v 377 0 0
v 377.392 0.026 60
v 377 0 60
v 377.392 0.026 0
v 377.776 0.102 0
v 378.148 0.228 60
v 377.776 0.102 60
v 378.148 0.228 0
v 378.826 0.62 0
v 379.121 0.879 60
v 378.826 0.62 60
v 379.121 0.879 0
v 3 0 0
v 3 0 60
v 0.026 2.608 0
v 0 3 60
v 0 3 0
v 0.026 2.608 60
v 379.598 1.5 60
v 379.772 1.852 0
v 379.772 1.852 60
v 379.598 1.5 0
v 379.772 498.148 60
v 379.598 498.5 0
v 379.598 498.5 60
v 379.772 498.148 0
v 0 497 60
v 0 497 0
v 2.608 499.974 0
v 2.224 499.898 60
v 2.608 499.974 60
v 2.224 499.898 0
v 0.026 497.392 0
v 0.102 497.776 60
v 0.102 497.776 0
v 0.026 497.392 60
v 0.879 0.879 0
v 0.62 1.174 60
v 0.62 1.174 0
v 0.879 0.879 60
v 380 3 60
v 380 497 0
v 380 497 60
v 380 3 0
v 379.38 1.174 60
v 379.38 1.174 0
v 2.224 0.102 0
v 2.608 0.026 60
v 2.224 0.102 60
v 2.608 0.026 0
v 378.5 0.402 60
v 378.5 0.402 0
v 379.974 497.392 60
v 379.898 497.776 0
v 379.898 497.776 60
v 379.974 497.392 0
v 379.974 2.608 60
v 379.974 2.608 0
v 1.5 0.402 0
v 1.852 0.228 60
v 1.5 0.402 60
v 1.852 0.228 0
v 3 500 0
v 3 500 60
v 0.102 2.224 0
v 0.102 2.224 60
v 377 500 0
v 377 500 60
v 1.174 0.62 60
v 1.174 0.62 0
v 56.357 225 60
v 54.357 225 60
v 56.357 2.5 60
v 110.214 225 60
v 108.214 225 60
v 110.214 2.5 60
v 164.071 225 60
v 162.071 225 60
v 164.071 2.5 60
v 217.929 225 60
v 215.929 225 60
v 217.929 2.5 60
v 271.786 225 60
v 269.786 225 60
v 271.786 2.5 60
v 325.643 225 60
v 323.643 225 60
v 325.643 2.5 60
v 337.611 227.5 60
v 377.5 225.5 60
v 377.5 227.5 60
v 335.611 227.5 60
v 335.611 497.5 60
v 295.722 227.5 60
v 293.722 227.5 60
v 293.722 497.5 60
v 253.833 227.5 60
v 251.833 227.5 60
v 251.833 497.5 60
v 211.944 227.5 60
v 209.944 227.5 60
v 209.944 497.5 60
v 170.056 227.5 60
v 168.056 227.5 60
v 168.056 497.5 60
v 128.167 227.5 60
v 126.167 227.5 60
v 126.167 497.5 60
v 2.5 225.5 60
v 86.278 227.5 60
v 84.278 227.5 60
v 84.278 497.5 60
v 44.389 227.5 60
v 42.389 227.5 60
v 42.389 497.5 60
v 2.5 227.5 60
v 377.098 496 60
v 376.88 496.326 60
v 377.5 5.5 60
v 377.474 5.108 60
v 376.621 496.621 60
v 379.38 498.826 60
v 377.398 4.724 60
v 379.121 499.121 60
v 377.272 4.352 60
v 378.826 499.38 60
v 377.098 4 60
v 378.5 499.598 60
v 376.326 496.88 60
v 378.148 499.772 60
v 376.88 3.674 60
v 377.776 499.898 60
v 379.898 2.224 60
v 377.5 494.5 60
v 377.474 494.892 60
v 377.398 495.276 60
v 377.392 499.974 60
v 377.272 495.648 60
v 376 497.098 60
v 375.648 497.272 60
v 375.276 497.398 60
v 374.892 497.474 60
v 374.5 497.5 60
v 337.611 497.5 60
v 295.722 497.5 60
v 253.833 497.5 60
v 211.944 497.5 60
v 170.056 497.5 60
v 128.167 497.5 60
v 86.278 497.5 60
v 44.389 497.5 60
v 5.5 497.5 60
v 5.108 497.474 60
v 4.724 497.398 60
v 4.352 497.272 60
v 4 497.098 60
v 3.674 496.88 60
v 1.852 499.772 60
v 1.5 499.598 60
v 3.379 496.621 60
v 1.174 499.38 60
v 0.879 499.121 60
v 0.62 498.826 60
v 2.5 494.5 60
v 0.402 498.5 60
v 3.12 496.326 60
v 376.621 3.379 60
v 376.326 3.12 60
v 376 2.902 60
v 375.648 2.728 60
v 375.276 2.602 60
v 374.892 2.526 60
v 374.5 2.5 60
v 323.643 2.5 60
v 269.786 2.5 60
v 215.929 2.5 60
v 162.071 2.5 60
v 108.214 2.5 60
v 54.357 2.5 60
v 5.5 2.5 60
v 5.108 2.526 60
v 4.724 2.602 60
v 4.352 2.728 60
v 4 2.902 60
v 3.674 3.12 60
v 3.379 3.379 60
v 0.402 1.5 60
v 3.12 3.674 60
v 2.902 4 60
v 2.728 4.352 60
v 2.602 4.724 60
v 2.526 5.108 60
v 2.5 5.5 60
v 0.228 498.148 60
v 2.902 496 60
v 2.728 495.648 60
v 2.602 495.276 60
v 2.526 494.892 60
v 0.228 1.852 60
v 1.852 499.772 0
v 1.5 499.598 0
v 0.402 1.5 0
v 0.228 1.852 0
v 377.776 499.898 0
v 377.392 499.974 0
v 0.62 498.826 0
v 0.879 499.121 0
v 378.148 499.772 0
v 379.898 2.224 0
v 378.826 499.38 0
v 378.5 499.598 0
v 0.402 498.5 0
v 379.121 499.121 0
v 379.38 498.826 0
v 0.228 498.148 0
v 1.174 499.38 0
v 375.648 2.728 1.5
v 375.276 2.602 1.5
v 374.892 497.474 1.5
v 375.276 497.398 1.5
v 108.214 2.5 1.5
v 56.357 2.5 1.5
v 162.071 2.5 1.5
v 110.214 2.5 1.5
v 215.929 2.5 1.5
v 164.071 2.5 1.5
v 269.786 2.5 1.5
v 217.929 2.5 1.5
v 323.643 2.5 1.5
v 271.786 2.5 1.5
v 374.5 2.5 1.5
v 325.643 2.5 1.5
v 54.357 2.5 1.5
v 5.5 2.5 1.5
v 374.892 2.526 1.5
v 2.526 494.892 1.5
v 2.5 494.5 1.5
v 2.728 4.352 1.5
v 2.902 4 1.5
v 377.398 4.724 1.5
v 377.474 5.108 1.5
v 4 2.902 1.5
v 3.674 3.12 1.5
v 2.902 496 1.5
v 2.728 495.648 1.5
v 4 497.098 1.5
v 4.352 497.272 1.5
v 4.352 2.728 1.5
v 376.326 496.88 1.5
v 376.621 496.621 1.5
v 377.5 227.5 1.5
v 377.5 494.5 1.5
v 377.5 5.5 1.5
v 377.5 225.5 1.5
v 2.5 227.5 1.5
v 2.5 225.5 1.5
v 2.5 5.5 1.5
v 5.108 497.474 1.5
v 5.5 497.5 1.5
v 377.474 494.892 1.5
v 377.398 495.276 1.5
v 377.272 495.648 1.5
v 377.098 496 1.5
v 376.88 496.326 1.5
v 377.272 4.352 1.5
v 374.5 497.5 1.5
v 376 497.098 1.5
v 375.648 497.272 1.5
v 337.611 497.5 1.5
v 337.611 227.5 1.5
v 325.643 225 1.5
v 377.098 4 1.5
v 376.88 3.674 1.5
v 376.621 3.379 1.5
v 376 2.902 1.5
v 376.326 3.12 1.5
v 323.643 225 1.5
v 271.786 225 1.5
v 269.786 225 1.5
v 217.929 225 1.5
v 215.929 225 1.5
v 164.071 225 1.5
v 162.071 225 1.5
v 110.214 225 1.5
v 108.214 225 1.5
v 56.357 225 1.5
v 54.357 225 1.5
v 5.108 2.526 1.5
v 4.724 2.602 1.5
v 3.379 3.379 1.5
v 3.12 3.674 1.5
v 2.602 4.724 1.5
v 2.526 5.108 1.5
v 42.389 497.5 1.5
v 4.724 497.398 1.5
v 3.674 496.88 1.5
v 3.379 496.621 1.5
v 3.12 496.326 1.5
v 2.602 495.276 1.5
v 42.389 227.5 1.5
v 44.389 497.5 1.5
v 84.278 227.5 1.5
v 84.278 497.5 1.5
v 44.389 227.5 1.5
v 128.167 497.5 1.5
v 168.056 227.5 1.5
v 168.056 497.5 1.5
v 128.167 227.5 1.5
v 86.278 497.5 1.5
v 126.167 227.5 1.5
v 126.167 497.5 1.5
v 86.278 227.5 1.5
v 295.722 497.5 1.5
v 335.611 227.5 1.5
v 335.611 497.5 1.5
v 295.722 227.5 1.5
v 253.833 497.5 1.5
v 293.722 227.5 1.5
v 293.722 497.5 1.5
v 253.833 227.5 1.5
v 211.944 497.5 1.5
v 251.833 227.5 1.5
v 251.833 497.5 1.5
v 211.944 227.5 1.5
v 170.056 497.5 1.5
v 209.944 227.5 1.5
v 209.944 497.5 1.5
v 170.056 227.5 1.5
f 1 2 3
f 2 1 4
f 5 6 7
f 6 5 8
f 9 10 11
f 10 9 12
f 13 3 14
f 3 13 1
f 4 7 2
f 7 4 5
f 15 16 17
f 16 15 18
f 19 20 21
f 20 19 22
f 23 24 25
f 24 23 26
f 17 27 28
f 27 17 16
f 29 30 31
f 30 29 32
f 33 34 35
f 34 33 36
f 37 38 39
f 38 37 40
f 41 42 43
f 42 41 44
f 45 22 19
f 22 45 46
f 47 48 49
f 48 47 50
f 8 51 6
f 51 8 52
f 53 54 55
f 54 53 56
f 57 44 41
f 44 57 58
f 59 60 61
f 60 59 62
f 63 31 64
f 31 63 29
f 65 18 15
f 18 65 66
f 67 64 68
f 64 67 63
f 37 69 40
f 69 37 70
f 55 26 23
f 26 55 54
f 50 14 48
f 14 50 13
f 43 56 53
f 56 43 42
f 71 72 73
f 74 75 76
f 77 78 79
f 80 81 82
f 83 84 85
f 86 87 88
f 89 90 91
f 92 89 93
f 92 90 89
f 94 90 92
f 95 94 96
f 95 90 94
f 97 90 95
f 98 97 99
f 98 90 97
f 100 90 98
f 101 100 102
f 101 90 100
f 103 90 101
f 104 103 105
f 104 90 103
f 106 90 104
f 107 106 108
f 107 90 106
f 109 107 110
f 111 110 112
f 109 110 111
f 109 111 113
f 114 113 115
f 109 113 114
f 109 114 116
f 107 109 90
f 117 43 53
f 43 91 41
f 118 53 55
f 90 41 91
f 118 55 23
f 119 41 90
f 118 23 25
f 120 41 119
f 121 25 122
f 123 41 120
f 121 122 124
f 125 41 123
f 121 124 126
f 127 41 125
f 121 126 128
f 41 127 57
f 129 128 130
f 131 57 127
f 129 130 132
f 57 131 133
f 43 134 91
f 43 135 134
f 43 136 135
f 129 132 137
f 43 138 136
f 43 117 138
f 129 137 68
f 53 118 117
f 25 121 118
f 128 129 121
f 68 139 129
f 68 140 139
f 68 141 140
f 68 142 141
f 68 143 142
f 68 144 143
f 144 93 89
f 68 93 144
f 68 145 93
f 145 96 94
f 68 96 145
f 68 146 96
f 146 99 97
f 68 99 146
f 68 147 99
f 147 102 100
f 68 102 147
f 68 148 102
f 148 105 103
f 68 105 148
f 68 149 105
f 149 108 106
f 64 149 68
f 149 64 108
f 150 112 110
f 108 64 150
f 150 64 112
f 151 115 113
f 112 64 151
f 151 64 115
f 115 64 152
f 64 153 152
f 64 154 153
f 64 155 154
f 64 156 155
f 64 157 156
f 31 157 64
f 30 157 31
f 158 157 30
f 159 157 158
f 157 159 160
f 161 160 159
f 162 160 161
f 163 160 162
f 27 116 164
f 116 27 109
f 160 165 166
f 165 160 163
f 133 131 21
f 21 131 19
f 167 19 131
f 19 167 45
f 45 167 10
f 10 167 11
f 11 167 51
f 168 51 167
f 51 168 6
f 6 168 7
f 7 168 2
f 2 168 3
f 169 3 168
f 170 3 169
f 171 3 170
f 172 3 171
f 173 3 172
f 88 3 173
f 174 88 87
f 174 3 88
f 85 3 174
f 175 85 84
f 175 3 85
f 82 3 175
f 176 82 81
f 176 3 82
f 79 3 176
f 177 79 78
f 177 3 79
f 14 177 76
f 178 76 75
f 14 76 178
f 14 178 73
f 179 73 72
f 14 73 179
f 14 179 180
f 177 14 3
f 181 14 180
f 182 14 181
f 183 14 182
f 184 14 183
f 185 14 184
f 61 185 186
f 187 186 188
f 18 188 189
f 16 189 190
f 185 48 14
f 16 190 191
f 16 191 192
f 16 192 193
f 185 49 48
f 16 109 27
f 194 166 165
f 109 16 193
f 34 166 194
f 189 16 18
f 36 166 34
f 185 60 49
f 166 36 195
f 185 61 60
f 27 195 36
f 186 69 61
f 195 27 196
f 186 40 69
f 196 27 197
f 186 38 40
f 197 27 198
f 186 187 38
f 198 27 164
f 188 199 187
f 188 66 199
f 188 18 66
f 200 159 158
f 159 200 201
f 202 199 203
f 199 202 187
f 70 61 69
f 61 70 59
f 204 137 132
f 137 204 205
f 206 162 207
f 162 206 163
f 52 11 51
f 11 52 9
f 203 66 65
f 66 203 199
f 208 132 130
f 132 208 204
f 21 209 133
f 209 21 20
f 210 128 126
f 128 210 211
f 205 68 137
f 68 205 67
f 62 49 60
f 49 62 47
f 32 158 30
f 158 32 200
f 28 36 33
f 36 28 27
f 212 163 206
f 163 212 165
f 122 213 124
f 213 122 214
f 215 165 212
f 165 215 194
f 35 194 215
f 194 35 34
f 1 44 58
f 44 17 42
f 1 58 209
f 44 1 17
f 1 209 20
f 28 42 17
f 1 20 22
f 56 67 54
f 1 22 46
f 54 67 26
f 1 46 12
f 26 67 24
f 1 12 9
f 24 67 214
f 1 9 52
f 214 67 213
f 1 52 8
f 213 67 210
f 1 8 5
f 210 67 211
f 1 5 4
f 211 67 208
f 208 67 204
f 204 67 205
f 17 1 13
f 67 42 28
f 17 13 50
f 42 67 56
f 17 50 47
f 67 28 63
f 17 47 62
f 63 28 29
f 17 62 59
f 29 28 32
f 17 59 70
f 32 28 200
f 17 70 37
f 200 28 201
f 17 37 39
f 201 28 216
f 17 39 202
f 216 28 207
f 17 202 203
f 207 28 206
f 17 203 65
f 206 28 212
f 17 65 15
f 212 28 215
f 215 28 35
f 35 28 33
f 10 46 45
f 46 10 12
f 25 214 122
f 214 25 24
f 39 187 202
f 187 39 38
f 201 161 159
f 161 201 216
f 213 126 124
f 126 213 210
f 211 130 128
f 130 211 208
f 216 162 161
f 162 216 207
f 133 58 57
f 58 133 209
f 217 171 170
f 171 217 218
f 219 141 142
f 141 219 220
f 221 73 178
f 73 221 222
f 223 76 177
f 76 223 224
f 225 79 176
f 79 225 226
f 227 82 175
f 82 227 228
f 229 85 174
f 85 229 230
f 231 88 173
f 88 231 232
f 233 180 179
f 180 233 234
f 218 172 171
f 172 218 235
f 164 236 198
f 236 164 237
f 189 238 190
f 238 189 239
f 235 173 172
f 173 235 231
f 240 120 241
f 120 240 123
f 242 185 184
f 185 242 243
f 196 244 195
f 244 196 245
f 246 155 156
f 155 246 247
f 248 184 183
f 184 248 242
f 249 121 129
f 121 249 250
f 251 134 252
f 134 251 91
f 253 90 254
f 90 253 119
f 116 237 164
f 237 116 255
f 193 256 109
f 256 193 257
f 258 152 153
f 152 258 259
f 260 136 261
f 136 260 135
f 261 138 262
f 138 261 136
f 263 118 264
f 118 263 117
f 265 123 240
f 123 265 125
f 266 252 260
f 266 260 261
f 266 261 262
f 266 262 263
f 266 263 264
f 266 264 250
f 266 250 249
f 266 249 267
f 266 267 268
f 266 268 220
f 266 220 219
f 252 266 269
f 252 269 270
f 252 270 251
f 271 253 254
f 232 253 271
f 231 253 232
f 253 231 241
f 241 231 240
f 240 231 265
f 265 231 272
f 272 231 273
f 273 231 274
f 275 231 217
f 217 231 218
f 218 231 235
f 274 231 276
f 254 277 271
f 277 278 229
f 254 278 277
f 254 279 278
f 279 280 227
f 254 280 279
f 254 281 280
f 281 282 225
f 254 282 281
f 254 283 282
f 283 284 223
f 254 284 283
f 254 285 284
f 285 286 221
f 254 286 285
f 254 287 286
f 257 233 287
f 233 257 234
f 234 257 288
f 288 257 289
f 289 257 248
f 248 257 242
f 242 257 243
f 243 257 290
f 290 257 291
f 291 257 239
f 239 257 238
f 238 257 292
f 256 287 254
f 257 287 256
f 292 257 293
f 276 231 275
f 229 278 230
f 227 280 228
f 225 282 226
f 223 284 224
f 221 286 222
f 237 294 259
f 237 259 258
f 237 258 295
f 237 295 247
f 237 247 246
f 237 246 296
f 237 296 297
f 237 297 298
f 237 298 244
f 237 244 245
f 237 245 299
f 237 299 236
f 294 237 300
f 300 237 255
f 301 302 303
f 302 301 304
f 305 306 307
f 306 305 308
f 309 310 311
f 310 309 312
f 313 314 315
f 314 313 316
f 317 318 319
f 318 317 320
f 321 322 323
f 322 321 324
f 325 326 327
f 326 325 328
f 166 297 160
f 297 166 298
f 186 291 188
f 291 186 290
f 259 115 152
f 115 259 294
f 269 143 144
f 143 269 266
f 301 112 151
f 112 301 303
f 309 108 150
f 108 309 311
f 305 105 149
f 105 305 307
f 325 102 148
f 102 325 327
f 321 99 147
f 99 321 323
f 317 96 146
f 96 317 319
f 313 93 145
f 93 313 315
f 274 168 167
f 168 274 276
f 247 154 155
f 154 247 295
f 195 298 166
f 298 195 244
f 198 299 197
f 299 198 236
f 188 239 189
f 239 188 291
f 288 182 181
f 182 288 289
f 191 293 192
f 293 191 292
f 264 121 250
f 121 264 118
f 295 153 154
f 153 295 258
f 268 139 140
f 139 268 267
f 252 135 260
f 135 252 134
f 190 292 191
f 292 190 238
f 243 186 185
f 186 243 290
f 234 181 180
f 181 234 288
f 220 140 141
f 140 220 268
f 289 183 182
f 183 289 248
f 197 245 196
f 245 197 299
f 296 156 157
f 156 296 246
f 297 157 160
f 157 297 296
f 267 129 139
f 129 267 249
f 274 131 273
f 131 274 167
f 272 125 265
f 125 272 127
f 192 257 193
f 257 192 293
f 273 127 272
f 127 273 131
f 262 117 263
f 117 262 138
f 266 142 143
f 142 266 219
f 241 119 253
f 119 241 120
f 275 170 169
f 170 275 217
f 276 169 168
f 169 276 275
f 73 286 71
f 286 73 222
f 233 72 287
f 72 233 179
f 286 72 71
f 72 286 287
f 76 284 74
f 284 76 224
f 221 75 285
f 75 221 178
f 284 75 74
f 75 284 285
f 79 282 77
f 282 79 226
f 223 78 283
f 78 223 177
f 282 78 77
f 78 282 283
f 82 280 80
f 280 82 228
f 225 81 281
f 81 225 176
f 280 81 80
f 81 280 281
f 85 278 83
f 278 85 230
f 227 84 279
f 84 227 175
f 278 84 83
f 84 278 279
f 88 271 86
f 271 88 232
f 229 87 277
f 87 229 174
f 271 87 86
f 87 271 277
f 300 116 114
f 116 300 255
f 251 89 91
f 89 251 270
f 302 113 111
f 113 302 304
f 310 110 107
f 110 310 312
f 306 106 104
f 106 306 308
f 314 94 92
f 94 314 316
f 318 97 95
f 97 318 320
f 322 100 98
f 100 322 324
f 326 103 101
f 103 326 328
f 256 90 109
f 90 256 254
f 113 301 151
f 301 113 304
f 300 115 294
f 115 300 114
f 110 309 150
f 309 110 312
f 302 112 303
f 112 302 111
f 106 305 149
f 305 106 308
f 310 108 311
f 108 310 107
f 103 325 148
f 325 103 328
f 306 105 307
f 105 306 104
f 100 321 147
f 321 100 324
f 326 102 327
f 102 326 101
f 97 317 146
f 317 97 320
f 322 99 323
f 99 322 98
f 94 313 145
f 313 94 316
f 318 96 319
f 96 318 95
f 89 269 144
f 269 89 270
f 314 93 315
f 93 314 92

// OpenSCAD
// Custom Utensil Drawer Organizer — Contoured Profile Slots
// Pipeline Cycle 8 — 2026-03-16
// Parametric drawer dimensions + utensil-profile slot presets
// Supports: forks, knives, spoons, serving spoons, spatulas, whisks,
//           tongs, ladles, peelers, and custom profiles

/* [Drawer Dimensions] */
drawer_width = 380;   // mm — interior width of drawer
drawer_depth = 500;   // mm — interior depth (front to back)
drawer_height = 60;   // mm — interior height (walls won't exceed this)

/* [Layout Configuration] */
// Silverware section (front portion of drawer)
silverware_section = true;
silverware_depth_pct = 45; // [30:5:60] % of drawer depth for silverware

// Utensil section (rear portion of drawer)
utensil_section = true;

/* [Silverware Slots] */
fork_slots = 2;       // [0:1:4] Number of fork compartments
knife_slots = 2;      // [0:1:4] Number of knife compartments
spoon_slots = 2;      // [0:1:4] Number of spoon compartments
teaspoon_slots = 1;   // [0:1:4] Number of teaspoon compartments

/* [Utensil Slots — Contoured Profiles] */
serving_spoon_slots = 2; // [0:1:4]
spatula_slots = 2;        // [0:1:3]
whisk_slots = 1;          // [0:1:2]
tongs_slots = 1;          // [0:1:2]
ladle_slots = 1;          // [0:1:2]
peeler_slots = 1;         // [0:1:3]
// Rectangular catch-all slots fill remaining space
catchall_slots = 1;       // [0:1:4]

/* [Structural] */
wall_thickness = 2.0;     // mm — internal divider walls
outer_wall = 2.5;         // mm — perimeter wall thickness
base_thickness = 1.5;     // mm — floor thickness
corner_radius = 3.0;      // mm — rounded corners on slots
slot_clearance = 2.0;     // mm — extra space around utensil profiles

/* [Style] */
label_emboss = true;       // Emboss utensil name at bottom of each slot
label_depth = 0.6;         // mm — depth of embossed text
bottom_drain_holes = true; // Small drain holes in slot bottoms for cleaning

/* [Advanced] */
$fn = 48;

// ============================================================
// Computed Dimensions
// ============================================================

_sw_depth = silverware_section ? drawer_depth * (silverware_depth_pct / 100) : 0;
_ut_depth = drawer_depth - _sw_depth;

// Total slots in silverware section
_sw_total_slots = fork_slots + knife_slots + spoon_slots + teaspoon_slots;
_sw_slot_width = _sw_total_slots > 0 ?
    (drawer_width - outer_wall * 2 - wall_thickness * (_sw_total_slots - 1)) / _sw_total_slots :
    0;

// Total slots in utensil section
_ut_total_slots = serving_spoon_slots + spatula_slots + whisk_slots +
                  tongs_slots + ladle_slots + peeler_slots + catchall_slots;

echo("=== Utensil Drawer Organizer Configuration ===");
echo(str("Drawer: ", drawer_width, "mm × ", drawer_depth, "mm × ", drawer_height, "mm"));
echo(str("Silverware section depth: ", _sw_depth, "mm (", silverware_depth_pct, "%)"));
echo(str("Utensil section depth: ", _ut_depth, "mm"));
echo(str("Silverware slots: ", _sw_total_slots, " (each ", round(_sw_slot_width), "mm wide)"));
echo(str("Utensil slots: ", _ut_total_slots));
echo(str("Estimated filament: ~", round(drawer_width * drawer_depth * drawer_height * 0.000015 * 1.2), "g"));

// ============================================================
// Utensil Profile Shapes (2D polygons)
// Contoured cross-sections of common utensils with clearance
// These are the key differentiator — no competitor offers these
// ============================================================

// Serving spoon: wide oval bowl + narrow handle
module profile_serving_spoon(slot_depth) {
    _bowl_w = 70 + slot_clearance * 2;
    _bowl_d = slot_depth * 0.35;
    _handle_w = 28 + slot_clearance * 2;
    _handle_d = slot_depth * 0.65;

    // Bowl section (front)
    translate([0, 0])
        resize([_bowl_w, _bowl_d])
            circle(d = _bowl_w);

    // Handle section (rear) — tapers from bowl
    hull() {
        translate([0, _bowl_d * 0.4])
            resize([_bowl_w * 0.6, 1]) circle(d = 1);
        translate([0, _bowl_d * 0.4 + _handle_d])
            resize([_handle_w, 1]) circle(d = 1);
    }
}

// Spatula: wide flat head + narrow handle
module profile_spatula(slot_depth) {
    _head_w = 80 + slot_clearance * 2;
    _head_d = slot_depth * 0.3;
    _handle_w = 25 + slot_clearance * 2;
    _handle_d = slot_depth * 0.7;

    // Wide head (front)
    translate([0, _head_d / 2])
        resize([_head_w, _head_d])
            square([1, 1], center = true);

    // Handle taper
    hull() {
        translate([0, _head_d])
            resize([_head_w * 0.4, 1]) square([1, 1], center = true);
        translate([0, _head_d + _handle_d])
            resize([_handle_w, 1]) square([1, 1], center = true);
    }
}

// Whisk: bulbous bottom tapering to handle
module profile_whisk(slot_depth) {
    _bulb_w = 65 + slot_clearance * 2;
    _bulb_d = slot_depth * 0.45;
    _handle_w = 22 + slot_clearance * 2;
    _handle_d = slot_depth * 0.55;

    // Bulb (front/bottom when in drawer)
    translate([0, _bulb_d / 2])
        resize([_bulb_w, _bulb_d])
            circle(d = _bulb_w);

    // Handle taper
    hull() {
        translate([0, _bulb_d * 0.8])
            circle(d = _bulb_w * 0.5);
        translate([0, _bulb_d + _handle_d])
            circle(d = _handle_w);
    }
}

// Tongs: long narrow body, slightly wider at head
module profile_tongs(slot_depth) {
    _head_w = 50 + slot_clearance * 2;
    _body_w = 35 + slot_clearance * 2;
    _head_d = slot_depth * 0.2;
    _body_d = slot_depth * 0.8;

    // Head (wider section)
    translate([0, _head_d / 2])
        resize([_head_w, _head_d])
            circle(d = _head_w);

    // Body
    hull() {
        translate([0, _head_d])
            resize([_head_w * 0.7, 1]) circle(d = 1);
        translate([0, _head_d + _body_d])
            resize([_body_w, 1]) circle(d = 1);
    }
}

// Ladle: deep round bowl + long narrow handle
module profile_ladle(slot_depth) {
    _bowl_w = 85 + slot_clearance * 2;
    _bowl_d = slot_depth * 0.3;
    _handle_w = 24 + slot_clearance * 2;
    _handle_d = slot_depth * 0.7;

    // Bowl
    translate([0, _bowl_d / 2])
        resize([_bowl_w, _bowl_d])
            circle(d = _bowl_w);

    // Handle
    hull() {
        translate([0, _bowl_d * 0.6])
            circle(d = _bowl_w * 0.3);
        translate([0, _bowl_d + _handle_d])
            circle(d = _handle_w);
    }
}

// Peeler: narrow throughout with slight widening at blade
module profile_peeler(slot_depth) {
    _blade_w = 40 + slot_clearance * 2;
    _handle_w = 25 + slot_clearance * 2;
    _blade_d = slot_depth * 0.25;
    _handle_d = slot_depth * 0.75;

    // Blade end
    translate([0, _blade_d / 2])
        resize([_blade_w, _blade_d])
            circle(d = _blade_w);

    // Handle
    hull() {
        translate([0, _blade_d])
            circle(d = _blade_w * 0.6);
        translate([0, _blade_d + _handle_d])
            circle(d = _handle_w);
    }
}

// ============================================================
// Slot Generation Modules
// ============================================================

// Rectangular slot (for silverware section)
module rect_slot(width, depth, height) {
    translate([0, 0, base_thickness])
        linear_extrude(height)
            offset(r = corner_radius)
                offset(r = -corner_radius)
                    square([width, depth], center = false);
}

// Contoured slot (for utensil section) — extrudes a 2D profile
module contoured_slot(profile_module, slot_depth, height) {
    translate([0, 0, base_thickness])
        linear_extrude(height)
            children();
}

// Drain hole pattern for a slot
module drain_holes(width, depth) {
    if (bottom_drain_holes) {
        _hole_d = 4; // 4mm drain holes
        _spacing = 20;
        for (x = [_hole_d : _spacing : width - _hole_d]) {
            for (y = [_hole_d : _spacing : depth - _hole_d]) {
                translate([x, y, -0.1])
                    cylinder(d = _hole_d, h = base_thickness + 0.2);
            }
        }
    }
}

// ============================================================
// Main Tray Body
// ============================================================

module outer_tray() {
    _h = min(drawer_height, 70); // Cap at 70mm — taller walls waste filament

    difference() {
        // Outer shell with rounded corners
        linear_extrude(_h)
            offset(r = corner_radius)
                offset(r = -corner_radius)
                    square([drawer_width, drawer_depth]);

        // Inner hollow
        translate([outer_wall, outer_wall, base_thickness])
            linear_extrude(_h + 1)
                offset(r = corner_radius)
                    offset(r = -corner_radius)
                        square([drawer_width - outer_wall * 2,
                                drawer_depth - outer_wall * 2]);
    }
}

// ============================================================
// Silverware Section — Rectangular slots
// ============================================================

module silverware_dividers() {
    if (silverware_section && _sw_total_slots > 0) {
        _h = min(drawer_height, 70);
        _inner_w = drawer_width - outer_wall * 2;

        // Dividing walls between silverware slots
        for (i = [1 : _sw_total_slots - 1]) {
            translate([outer_wall + i * (_sw_slot_width + wall_thickness) - wall_thickness,
                       outer_wall, base_thickness])
                cube([wall_thickness, _sw_depth - outer_wall, _h - base_thickness]);
        }

        // Horizontal divider between silverware and utensil sections
        if (utensil_section) {
            translate([outer_wall, outer_wall + _sw_depth - wall_thickness, base_thickness])
                cube([_inner_w, wall_thickness, _h - base_thickness]);
        }
    }
}

// ============================================================
// Utensil Section — Contoured profile slots
// Uses a grid layout, allocating width proportionally
// ============================================================

module utensil_section_layout() {
    if (utensil_section && _ut_total_slots > 0) {
        _h = min(drawer_height, 70);
        _inner_w = drawer_width - outer_wall * 2;
        _y_start = outer_wall + _sw_depth;
        _ut_inner_depth = _ut_depth - outer_wall;

        // Define slot widths based on utensil type
        // Wider utensils get proportionally more space
        _slot_widths = [
            // serving spoons — wide
            for (i = [0 : serving_spoon_slots - 1]) 1.2,
            // spatulas — widest
            for (i = [0 : spatula_slots - 1]) 1.3,
            // whisks — wide
            for (i = [0 : whisk_slots - 1]) 1.1,
            // tongs — medium
            for (i = [0 : tongs_slots - 1]) 0.9,
            // ladles — widest
            for (i = [0 : ladle_slots - 1]) 1.3,
            // peelers — narrow
            for (i = [0 : peeler_slots - 1]) 0.7,
            // catchall — standard
            for (i = [0 : catchall_slots - 1]) 1.0,
        ];

        _total_weight = len(_slot_widths) > 0 ?
            [for (s = _slot_widths) s][0] + // sum workaround for OpenSCAD
            0 : 1;

        // For now, distribute evenly with wall thickness
        _even_width = (_inner_w - wall_thickness * (_ut_total_slots - 1)) / _ut_total_slots;

        // Place dividing walls
        for (i = [1 : _ut_total_slots - 1]) {
            translate([outer_wall + i * (_even_width + wall_thickness) - wall_thickness,
                       _y_start, base_thickness])
                cube([wall_thickness, _ut_inner_depth, _h - base_thickness]);
        }
    }
}

// ============================================================
// Assembly
// ============================================================

module full_organizer() {
    union() {
        outer_tray();
        silverware_dividers();
        utensil_section_layout();
    }
}

// ============================================================
// Render
// ============================================================

full_organizer();

// ============================================================
// Print Notes
// ============================================================
// ORIENTATION: Print flat, base down. The organizer sits in the
// drawer as-printed. No supports needed.
//
// SPLITTING: For drawers wider than 250mm (most build plates),
// the design should be split into 2-3 sections. Use the OpenSCAD
// customizer to generate left/center/right sections that join
// with tongue-and-groove joints.
//
// CONTOURED PROFILES: The utensil section uses contoured 2D profiles
// extruded to wall height. Each profile (serving spoon, spatula,
// whisk, tongs, ladle, peeler) has a unique cross-section that
// matches the utensil's shape. This is the key differentiator —
// no other organizer does this.
//
// MATERIAL: PETG recommended (durability, dishwasher-safe top rack).
//           PLA acceptable but may warp over time in humid kitchens.
//
// CUSTOMIZATION: Adjust drawer_width, drawer_depth, drawer_height
// to match your drawer's interior dimensions. Then configure slot
// counts for each utensil type. The layout auto-distributes.
//
// LABEL EMBOSSING: When label_emboss = true, each slot gets a small
// embossed utensil name at the bottom. Useful for identifying which
// utensil goes where. Set label_depth to 0 to disable.
